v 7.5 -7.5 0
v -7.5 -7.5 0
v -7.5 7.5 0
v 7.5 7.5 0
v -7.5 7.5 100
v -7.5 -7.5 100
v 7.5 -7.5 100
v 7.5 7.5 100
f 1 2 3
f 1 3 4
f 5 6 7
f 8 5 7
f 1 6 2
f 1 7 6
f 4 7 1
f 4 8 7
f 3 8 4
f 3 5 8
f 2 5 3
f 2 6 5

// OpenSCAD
$fn = 64;

length = 100;
size = 15;

linear_extrude(height = length)
    square([size, size], center = true);
